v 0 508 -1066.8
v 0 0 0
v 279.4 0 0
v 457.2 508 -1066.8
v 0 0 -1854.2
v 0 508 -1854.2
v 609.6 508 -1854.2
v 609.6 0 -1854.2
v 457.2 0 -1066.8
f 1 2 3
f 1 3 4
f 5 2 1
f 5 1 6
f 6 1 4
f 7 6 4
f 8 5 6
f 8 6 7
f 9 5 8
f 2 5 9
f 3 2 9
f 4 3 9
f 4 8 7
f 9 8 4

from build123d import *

# Parameters (mm, degrees)
BOSS_EXTRUDE1_DEPTH = 508
CUT_EXTRUDE1_DEPTH  = 508
BOSS_EXTRUDE2_DEPTH = 508


with BuildPart() as part:
    # Sketch1 → Boss-Extrude1 (new body)
    with BuildSketch(Plane(origin=(0, 0, 0), x_dir=(1, 0, 0), z_dir=(0, 1, 0))):
        Polygon((0, 1066.8), (0, 0), (279.4, 0), (457.2, 1066.8), align=None)
    extrude(amount=BOSS_EXTRUDE1_DEPTH)

    # Sketch2 → Cut-Extrude1 (cut)
    with BuildSketch(Plane.ZY):
        Polygon((0, 0), (-1066.8, 508), (-1066.8, 732.672417782), (0, 732.672417782), align=None)
    extrude(amount=-CUT_EXTRUDE1_DEPTH, mode=Mode.SUBTRACT)

    # Sketch3 → Boss-Extrude2 (add)
    with BuildSketch(Plane.XZ):
        Polygon((0, -1066.8), (0, -1854.2), (609.6, -1854.2), (457.2, -1066.8), align=None)
    extrude(amount=-BOSS_EXTRUDE2_DEPTH)


solid = part.part
